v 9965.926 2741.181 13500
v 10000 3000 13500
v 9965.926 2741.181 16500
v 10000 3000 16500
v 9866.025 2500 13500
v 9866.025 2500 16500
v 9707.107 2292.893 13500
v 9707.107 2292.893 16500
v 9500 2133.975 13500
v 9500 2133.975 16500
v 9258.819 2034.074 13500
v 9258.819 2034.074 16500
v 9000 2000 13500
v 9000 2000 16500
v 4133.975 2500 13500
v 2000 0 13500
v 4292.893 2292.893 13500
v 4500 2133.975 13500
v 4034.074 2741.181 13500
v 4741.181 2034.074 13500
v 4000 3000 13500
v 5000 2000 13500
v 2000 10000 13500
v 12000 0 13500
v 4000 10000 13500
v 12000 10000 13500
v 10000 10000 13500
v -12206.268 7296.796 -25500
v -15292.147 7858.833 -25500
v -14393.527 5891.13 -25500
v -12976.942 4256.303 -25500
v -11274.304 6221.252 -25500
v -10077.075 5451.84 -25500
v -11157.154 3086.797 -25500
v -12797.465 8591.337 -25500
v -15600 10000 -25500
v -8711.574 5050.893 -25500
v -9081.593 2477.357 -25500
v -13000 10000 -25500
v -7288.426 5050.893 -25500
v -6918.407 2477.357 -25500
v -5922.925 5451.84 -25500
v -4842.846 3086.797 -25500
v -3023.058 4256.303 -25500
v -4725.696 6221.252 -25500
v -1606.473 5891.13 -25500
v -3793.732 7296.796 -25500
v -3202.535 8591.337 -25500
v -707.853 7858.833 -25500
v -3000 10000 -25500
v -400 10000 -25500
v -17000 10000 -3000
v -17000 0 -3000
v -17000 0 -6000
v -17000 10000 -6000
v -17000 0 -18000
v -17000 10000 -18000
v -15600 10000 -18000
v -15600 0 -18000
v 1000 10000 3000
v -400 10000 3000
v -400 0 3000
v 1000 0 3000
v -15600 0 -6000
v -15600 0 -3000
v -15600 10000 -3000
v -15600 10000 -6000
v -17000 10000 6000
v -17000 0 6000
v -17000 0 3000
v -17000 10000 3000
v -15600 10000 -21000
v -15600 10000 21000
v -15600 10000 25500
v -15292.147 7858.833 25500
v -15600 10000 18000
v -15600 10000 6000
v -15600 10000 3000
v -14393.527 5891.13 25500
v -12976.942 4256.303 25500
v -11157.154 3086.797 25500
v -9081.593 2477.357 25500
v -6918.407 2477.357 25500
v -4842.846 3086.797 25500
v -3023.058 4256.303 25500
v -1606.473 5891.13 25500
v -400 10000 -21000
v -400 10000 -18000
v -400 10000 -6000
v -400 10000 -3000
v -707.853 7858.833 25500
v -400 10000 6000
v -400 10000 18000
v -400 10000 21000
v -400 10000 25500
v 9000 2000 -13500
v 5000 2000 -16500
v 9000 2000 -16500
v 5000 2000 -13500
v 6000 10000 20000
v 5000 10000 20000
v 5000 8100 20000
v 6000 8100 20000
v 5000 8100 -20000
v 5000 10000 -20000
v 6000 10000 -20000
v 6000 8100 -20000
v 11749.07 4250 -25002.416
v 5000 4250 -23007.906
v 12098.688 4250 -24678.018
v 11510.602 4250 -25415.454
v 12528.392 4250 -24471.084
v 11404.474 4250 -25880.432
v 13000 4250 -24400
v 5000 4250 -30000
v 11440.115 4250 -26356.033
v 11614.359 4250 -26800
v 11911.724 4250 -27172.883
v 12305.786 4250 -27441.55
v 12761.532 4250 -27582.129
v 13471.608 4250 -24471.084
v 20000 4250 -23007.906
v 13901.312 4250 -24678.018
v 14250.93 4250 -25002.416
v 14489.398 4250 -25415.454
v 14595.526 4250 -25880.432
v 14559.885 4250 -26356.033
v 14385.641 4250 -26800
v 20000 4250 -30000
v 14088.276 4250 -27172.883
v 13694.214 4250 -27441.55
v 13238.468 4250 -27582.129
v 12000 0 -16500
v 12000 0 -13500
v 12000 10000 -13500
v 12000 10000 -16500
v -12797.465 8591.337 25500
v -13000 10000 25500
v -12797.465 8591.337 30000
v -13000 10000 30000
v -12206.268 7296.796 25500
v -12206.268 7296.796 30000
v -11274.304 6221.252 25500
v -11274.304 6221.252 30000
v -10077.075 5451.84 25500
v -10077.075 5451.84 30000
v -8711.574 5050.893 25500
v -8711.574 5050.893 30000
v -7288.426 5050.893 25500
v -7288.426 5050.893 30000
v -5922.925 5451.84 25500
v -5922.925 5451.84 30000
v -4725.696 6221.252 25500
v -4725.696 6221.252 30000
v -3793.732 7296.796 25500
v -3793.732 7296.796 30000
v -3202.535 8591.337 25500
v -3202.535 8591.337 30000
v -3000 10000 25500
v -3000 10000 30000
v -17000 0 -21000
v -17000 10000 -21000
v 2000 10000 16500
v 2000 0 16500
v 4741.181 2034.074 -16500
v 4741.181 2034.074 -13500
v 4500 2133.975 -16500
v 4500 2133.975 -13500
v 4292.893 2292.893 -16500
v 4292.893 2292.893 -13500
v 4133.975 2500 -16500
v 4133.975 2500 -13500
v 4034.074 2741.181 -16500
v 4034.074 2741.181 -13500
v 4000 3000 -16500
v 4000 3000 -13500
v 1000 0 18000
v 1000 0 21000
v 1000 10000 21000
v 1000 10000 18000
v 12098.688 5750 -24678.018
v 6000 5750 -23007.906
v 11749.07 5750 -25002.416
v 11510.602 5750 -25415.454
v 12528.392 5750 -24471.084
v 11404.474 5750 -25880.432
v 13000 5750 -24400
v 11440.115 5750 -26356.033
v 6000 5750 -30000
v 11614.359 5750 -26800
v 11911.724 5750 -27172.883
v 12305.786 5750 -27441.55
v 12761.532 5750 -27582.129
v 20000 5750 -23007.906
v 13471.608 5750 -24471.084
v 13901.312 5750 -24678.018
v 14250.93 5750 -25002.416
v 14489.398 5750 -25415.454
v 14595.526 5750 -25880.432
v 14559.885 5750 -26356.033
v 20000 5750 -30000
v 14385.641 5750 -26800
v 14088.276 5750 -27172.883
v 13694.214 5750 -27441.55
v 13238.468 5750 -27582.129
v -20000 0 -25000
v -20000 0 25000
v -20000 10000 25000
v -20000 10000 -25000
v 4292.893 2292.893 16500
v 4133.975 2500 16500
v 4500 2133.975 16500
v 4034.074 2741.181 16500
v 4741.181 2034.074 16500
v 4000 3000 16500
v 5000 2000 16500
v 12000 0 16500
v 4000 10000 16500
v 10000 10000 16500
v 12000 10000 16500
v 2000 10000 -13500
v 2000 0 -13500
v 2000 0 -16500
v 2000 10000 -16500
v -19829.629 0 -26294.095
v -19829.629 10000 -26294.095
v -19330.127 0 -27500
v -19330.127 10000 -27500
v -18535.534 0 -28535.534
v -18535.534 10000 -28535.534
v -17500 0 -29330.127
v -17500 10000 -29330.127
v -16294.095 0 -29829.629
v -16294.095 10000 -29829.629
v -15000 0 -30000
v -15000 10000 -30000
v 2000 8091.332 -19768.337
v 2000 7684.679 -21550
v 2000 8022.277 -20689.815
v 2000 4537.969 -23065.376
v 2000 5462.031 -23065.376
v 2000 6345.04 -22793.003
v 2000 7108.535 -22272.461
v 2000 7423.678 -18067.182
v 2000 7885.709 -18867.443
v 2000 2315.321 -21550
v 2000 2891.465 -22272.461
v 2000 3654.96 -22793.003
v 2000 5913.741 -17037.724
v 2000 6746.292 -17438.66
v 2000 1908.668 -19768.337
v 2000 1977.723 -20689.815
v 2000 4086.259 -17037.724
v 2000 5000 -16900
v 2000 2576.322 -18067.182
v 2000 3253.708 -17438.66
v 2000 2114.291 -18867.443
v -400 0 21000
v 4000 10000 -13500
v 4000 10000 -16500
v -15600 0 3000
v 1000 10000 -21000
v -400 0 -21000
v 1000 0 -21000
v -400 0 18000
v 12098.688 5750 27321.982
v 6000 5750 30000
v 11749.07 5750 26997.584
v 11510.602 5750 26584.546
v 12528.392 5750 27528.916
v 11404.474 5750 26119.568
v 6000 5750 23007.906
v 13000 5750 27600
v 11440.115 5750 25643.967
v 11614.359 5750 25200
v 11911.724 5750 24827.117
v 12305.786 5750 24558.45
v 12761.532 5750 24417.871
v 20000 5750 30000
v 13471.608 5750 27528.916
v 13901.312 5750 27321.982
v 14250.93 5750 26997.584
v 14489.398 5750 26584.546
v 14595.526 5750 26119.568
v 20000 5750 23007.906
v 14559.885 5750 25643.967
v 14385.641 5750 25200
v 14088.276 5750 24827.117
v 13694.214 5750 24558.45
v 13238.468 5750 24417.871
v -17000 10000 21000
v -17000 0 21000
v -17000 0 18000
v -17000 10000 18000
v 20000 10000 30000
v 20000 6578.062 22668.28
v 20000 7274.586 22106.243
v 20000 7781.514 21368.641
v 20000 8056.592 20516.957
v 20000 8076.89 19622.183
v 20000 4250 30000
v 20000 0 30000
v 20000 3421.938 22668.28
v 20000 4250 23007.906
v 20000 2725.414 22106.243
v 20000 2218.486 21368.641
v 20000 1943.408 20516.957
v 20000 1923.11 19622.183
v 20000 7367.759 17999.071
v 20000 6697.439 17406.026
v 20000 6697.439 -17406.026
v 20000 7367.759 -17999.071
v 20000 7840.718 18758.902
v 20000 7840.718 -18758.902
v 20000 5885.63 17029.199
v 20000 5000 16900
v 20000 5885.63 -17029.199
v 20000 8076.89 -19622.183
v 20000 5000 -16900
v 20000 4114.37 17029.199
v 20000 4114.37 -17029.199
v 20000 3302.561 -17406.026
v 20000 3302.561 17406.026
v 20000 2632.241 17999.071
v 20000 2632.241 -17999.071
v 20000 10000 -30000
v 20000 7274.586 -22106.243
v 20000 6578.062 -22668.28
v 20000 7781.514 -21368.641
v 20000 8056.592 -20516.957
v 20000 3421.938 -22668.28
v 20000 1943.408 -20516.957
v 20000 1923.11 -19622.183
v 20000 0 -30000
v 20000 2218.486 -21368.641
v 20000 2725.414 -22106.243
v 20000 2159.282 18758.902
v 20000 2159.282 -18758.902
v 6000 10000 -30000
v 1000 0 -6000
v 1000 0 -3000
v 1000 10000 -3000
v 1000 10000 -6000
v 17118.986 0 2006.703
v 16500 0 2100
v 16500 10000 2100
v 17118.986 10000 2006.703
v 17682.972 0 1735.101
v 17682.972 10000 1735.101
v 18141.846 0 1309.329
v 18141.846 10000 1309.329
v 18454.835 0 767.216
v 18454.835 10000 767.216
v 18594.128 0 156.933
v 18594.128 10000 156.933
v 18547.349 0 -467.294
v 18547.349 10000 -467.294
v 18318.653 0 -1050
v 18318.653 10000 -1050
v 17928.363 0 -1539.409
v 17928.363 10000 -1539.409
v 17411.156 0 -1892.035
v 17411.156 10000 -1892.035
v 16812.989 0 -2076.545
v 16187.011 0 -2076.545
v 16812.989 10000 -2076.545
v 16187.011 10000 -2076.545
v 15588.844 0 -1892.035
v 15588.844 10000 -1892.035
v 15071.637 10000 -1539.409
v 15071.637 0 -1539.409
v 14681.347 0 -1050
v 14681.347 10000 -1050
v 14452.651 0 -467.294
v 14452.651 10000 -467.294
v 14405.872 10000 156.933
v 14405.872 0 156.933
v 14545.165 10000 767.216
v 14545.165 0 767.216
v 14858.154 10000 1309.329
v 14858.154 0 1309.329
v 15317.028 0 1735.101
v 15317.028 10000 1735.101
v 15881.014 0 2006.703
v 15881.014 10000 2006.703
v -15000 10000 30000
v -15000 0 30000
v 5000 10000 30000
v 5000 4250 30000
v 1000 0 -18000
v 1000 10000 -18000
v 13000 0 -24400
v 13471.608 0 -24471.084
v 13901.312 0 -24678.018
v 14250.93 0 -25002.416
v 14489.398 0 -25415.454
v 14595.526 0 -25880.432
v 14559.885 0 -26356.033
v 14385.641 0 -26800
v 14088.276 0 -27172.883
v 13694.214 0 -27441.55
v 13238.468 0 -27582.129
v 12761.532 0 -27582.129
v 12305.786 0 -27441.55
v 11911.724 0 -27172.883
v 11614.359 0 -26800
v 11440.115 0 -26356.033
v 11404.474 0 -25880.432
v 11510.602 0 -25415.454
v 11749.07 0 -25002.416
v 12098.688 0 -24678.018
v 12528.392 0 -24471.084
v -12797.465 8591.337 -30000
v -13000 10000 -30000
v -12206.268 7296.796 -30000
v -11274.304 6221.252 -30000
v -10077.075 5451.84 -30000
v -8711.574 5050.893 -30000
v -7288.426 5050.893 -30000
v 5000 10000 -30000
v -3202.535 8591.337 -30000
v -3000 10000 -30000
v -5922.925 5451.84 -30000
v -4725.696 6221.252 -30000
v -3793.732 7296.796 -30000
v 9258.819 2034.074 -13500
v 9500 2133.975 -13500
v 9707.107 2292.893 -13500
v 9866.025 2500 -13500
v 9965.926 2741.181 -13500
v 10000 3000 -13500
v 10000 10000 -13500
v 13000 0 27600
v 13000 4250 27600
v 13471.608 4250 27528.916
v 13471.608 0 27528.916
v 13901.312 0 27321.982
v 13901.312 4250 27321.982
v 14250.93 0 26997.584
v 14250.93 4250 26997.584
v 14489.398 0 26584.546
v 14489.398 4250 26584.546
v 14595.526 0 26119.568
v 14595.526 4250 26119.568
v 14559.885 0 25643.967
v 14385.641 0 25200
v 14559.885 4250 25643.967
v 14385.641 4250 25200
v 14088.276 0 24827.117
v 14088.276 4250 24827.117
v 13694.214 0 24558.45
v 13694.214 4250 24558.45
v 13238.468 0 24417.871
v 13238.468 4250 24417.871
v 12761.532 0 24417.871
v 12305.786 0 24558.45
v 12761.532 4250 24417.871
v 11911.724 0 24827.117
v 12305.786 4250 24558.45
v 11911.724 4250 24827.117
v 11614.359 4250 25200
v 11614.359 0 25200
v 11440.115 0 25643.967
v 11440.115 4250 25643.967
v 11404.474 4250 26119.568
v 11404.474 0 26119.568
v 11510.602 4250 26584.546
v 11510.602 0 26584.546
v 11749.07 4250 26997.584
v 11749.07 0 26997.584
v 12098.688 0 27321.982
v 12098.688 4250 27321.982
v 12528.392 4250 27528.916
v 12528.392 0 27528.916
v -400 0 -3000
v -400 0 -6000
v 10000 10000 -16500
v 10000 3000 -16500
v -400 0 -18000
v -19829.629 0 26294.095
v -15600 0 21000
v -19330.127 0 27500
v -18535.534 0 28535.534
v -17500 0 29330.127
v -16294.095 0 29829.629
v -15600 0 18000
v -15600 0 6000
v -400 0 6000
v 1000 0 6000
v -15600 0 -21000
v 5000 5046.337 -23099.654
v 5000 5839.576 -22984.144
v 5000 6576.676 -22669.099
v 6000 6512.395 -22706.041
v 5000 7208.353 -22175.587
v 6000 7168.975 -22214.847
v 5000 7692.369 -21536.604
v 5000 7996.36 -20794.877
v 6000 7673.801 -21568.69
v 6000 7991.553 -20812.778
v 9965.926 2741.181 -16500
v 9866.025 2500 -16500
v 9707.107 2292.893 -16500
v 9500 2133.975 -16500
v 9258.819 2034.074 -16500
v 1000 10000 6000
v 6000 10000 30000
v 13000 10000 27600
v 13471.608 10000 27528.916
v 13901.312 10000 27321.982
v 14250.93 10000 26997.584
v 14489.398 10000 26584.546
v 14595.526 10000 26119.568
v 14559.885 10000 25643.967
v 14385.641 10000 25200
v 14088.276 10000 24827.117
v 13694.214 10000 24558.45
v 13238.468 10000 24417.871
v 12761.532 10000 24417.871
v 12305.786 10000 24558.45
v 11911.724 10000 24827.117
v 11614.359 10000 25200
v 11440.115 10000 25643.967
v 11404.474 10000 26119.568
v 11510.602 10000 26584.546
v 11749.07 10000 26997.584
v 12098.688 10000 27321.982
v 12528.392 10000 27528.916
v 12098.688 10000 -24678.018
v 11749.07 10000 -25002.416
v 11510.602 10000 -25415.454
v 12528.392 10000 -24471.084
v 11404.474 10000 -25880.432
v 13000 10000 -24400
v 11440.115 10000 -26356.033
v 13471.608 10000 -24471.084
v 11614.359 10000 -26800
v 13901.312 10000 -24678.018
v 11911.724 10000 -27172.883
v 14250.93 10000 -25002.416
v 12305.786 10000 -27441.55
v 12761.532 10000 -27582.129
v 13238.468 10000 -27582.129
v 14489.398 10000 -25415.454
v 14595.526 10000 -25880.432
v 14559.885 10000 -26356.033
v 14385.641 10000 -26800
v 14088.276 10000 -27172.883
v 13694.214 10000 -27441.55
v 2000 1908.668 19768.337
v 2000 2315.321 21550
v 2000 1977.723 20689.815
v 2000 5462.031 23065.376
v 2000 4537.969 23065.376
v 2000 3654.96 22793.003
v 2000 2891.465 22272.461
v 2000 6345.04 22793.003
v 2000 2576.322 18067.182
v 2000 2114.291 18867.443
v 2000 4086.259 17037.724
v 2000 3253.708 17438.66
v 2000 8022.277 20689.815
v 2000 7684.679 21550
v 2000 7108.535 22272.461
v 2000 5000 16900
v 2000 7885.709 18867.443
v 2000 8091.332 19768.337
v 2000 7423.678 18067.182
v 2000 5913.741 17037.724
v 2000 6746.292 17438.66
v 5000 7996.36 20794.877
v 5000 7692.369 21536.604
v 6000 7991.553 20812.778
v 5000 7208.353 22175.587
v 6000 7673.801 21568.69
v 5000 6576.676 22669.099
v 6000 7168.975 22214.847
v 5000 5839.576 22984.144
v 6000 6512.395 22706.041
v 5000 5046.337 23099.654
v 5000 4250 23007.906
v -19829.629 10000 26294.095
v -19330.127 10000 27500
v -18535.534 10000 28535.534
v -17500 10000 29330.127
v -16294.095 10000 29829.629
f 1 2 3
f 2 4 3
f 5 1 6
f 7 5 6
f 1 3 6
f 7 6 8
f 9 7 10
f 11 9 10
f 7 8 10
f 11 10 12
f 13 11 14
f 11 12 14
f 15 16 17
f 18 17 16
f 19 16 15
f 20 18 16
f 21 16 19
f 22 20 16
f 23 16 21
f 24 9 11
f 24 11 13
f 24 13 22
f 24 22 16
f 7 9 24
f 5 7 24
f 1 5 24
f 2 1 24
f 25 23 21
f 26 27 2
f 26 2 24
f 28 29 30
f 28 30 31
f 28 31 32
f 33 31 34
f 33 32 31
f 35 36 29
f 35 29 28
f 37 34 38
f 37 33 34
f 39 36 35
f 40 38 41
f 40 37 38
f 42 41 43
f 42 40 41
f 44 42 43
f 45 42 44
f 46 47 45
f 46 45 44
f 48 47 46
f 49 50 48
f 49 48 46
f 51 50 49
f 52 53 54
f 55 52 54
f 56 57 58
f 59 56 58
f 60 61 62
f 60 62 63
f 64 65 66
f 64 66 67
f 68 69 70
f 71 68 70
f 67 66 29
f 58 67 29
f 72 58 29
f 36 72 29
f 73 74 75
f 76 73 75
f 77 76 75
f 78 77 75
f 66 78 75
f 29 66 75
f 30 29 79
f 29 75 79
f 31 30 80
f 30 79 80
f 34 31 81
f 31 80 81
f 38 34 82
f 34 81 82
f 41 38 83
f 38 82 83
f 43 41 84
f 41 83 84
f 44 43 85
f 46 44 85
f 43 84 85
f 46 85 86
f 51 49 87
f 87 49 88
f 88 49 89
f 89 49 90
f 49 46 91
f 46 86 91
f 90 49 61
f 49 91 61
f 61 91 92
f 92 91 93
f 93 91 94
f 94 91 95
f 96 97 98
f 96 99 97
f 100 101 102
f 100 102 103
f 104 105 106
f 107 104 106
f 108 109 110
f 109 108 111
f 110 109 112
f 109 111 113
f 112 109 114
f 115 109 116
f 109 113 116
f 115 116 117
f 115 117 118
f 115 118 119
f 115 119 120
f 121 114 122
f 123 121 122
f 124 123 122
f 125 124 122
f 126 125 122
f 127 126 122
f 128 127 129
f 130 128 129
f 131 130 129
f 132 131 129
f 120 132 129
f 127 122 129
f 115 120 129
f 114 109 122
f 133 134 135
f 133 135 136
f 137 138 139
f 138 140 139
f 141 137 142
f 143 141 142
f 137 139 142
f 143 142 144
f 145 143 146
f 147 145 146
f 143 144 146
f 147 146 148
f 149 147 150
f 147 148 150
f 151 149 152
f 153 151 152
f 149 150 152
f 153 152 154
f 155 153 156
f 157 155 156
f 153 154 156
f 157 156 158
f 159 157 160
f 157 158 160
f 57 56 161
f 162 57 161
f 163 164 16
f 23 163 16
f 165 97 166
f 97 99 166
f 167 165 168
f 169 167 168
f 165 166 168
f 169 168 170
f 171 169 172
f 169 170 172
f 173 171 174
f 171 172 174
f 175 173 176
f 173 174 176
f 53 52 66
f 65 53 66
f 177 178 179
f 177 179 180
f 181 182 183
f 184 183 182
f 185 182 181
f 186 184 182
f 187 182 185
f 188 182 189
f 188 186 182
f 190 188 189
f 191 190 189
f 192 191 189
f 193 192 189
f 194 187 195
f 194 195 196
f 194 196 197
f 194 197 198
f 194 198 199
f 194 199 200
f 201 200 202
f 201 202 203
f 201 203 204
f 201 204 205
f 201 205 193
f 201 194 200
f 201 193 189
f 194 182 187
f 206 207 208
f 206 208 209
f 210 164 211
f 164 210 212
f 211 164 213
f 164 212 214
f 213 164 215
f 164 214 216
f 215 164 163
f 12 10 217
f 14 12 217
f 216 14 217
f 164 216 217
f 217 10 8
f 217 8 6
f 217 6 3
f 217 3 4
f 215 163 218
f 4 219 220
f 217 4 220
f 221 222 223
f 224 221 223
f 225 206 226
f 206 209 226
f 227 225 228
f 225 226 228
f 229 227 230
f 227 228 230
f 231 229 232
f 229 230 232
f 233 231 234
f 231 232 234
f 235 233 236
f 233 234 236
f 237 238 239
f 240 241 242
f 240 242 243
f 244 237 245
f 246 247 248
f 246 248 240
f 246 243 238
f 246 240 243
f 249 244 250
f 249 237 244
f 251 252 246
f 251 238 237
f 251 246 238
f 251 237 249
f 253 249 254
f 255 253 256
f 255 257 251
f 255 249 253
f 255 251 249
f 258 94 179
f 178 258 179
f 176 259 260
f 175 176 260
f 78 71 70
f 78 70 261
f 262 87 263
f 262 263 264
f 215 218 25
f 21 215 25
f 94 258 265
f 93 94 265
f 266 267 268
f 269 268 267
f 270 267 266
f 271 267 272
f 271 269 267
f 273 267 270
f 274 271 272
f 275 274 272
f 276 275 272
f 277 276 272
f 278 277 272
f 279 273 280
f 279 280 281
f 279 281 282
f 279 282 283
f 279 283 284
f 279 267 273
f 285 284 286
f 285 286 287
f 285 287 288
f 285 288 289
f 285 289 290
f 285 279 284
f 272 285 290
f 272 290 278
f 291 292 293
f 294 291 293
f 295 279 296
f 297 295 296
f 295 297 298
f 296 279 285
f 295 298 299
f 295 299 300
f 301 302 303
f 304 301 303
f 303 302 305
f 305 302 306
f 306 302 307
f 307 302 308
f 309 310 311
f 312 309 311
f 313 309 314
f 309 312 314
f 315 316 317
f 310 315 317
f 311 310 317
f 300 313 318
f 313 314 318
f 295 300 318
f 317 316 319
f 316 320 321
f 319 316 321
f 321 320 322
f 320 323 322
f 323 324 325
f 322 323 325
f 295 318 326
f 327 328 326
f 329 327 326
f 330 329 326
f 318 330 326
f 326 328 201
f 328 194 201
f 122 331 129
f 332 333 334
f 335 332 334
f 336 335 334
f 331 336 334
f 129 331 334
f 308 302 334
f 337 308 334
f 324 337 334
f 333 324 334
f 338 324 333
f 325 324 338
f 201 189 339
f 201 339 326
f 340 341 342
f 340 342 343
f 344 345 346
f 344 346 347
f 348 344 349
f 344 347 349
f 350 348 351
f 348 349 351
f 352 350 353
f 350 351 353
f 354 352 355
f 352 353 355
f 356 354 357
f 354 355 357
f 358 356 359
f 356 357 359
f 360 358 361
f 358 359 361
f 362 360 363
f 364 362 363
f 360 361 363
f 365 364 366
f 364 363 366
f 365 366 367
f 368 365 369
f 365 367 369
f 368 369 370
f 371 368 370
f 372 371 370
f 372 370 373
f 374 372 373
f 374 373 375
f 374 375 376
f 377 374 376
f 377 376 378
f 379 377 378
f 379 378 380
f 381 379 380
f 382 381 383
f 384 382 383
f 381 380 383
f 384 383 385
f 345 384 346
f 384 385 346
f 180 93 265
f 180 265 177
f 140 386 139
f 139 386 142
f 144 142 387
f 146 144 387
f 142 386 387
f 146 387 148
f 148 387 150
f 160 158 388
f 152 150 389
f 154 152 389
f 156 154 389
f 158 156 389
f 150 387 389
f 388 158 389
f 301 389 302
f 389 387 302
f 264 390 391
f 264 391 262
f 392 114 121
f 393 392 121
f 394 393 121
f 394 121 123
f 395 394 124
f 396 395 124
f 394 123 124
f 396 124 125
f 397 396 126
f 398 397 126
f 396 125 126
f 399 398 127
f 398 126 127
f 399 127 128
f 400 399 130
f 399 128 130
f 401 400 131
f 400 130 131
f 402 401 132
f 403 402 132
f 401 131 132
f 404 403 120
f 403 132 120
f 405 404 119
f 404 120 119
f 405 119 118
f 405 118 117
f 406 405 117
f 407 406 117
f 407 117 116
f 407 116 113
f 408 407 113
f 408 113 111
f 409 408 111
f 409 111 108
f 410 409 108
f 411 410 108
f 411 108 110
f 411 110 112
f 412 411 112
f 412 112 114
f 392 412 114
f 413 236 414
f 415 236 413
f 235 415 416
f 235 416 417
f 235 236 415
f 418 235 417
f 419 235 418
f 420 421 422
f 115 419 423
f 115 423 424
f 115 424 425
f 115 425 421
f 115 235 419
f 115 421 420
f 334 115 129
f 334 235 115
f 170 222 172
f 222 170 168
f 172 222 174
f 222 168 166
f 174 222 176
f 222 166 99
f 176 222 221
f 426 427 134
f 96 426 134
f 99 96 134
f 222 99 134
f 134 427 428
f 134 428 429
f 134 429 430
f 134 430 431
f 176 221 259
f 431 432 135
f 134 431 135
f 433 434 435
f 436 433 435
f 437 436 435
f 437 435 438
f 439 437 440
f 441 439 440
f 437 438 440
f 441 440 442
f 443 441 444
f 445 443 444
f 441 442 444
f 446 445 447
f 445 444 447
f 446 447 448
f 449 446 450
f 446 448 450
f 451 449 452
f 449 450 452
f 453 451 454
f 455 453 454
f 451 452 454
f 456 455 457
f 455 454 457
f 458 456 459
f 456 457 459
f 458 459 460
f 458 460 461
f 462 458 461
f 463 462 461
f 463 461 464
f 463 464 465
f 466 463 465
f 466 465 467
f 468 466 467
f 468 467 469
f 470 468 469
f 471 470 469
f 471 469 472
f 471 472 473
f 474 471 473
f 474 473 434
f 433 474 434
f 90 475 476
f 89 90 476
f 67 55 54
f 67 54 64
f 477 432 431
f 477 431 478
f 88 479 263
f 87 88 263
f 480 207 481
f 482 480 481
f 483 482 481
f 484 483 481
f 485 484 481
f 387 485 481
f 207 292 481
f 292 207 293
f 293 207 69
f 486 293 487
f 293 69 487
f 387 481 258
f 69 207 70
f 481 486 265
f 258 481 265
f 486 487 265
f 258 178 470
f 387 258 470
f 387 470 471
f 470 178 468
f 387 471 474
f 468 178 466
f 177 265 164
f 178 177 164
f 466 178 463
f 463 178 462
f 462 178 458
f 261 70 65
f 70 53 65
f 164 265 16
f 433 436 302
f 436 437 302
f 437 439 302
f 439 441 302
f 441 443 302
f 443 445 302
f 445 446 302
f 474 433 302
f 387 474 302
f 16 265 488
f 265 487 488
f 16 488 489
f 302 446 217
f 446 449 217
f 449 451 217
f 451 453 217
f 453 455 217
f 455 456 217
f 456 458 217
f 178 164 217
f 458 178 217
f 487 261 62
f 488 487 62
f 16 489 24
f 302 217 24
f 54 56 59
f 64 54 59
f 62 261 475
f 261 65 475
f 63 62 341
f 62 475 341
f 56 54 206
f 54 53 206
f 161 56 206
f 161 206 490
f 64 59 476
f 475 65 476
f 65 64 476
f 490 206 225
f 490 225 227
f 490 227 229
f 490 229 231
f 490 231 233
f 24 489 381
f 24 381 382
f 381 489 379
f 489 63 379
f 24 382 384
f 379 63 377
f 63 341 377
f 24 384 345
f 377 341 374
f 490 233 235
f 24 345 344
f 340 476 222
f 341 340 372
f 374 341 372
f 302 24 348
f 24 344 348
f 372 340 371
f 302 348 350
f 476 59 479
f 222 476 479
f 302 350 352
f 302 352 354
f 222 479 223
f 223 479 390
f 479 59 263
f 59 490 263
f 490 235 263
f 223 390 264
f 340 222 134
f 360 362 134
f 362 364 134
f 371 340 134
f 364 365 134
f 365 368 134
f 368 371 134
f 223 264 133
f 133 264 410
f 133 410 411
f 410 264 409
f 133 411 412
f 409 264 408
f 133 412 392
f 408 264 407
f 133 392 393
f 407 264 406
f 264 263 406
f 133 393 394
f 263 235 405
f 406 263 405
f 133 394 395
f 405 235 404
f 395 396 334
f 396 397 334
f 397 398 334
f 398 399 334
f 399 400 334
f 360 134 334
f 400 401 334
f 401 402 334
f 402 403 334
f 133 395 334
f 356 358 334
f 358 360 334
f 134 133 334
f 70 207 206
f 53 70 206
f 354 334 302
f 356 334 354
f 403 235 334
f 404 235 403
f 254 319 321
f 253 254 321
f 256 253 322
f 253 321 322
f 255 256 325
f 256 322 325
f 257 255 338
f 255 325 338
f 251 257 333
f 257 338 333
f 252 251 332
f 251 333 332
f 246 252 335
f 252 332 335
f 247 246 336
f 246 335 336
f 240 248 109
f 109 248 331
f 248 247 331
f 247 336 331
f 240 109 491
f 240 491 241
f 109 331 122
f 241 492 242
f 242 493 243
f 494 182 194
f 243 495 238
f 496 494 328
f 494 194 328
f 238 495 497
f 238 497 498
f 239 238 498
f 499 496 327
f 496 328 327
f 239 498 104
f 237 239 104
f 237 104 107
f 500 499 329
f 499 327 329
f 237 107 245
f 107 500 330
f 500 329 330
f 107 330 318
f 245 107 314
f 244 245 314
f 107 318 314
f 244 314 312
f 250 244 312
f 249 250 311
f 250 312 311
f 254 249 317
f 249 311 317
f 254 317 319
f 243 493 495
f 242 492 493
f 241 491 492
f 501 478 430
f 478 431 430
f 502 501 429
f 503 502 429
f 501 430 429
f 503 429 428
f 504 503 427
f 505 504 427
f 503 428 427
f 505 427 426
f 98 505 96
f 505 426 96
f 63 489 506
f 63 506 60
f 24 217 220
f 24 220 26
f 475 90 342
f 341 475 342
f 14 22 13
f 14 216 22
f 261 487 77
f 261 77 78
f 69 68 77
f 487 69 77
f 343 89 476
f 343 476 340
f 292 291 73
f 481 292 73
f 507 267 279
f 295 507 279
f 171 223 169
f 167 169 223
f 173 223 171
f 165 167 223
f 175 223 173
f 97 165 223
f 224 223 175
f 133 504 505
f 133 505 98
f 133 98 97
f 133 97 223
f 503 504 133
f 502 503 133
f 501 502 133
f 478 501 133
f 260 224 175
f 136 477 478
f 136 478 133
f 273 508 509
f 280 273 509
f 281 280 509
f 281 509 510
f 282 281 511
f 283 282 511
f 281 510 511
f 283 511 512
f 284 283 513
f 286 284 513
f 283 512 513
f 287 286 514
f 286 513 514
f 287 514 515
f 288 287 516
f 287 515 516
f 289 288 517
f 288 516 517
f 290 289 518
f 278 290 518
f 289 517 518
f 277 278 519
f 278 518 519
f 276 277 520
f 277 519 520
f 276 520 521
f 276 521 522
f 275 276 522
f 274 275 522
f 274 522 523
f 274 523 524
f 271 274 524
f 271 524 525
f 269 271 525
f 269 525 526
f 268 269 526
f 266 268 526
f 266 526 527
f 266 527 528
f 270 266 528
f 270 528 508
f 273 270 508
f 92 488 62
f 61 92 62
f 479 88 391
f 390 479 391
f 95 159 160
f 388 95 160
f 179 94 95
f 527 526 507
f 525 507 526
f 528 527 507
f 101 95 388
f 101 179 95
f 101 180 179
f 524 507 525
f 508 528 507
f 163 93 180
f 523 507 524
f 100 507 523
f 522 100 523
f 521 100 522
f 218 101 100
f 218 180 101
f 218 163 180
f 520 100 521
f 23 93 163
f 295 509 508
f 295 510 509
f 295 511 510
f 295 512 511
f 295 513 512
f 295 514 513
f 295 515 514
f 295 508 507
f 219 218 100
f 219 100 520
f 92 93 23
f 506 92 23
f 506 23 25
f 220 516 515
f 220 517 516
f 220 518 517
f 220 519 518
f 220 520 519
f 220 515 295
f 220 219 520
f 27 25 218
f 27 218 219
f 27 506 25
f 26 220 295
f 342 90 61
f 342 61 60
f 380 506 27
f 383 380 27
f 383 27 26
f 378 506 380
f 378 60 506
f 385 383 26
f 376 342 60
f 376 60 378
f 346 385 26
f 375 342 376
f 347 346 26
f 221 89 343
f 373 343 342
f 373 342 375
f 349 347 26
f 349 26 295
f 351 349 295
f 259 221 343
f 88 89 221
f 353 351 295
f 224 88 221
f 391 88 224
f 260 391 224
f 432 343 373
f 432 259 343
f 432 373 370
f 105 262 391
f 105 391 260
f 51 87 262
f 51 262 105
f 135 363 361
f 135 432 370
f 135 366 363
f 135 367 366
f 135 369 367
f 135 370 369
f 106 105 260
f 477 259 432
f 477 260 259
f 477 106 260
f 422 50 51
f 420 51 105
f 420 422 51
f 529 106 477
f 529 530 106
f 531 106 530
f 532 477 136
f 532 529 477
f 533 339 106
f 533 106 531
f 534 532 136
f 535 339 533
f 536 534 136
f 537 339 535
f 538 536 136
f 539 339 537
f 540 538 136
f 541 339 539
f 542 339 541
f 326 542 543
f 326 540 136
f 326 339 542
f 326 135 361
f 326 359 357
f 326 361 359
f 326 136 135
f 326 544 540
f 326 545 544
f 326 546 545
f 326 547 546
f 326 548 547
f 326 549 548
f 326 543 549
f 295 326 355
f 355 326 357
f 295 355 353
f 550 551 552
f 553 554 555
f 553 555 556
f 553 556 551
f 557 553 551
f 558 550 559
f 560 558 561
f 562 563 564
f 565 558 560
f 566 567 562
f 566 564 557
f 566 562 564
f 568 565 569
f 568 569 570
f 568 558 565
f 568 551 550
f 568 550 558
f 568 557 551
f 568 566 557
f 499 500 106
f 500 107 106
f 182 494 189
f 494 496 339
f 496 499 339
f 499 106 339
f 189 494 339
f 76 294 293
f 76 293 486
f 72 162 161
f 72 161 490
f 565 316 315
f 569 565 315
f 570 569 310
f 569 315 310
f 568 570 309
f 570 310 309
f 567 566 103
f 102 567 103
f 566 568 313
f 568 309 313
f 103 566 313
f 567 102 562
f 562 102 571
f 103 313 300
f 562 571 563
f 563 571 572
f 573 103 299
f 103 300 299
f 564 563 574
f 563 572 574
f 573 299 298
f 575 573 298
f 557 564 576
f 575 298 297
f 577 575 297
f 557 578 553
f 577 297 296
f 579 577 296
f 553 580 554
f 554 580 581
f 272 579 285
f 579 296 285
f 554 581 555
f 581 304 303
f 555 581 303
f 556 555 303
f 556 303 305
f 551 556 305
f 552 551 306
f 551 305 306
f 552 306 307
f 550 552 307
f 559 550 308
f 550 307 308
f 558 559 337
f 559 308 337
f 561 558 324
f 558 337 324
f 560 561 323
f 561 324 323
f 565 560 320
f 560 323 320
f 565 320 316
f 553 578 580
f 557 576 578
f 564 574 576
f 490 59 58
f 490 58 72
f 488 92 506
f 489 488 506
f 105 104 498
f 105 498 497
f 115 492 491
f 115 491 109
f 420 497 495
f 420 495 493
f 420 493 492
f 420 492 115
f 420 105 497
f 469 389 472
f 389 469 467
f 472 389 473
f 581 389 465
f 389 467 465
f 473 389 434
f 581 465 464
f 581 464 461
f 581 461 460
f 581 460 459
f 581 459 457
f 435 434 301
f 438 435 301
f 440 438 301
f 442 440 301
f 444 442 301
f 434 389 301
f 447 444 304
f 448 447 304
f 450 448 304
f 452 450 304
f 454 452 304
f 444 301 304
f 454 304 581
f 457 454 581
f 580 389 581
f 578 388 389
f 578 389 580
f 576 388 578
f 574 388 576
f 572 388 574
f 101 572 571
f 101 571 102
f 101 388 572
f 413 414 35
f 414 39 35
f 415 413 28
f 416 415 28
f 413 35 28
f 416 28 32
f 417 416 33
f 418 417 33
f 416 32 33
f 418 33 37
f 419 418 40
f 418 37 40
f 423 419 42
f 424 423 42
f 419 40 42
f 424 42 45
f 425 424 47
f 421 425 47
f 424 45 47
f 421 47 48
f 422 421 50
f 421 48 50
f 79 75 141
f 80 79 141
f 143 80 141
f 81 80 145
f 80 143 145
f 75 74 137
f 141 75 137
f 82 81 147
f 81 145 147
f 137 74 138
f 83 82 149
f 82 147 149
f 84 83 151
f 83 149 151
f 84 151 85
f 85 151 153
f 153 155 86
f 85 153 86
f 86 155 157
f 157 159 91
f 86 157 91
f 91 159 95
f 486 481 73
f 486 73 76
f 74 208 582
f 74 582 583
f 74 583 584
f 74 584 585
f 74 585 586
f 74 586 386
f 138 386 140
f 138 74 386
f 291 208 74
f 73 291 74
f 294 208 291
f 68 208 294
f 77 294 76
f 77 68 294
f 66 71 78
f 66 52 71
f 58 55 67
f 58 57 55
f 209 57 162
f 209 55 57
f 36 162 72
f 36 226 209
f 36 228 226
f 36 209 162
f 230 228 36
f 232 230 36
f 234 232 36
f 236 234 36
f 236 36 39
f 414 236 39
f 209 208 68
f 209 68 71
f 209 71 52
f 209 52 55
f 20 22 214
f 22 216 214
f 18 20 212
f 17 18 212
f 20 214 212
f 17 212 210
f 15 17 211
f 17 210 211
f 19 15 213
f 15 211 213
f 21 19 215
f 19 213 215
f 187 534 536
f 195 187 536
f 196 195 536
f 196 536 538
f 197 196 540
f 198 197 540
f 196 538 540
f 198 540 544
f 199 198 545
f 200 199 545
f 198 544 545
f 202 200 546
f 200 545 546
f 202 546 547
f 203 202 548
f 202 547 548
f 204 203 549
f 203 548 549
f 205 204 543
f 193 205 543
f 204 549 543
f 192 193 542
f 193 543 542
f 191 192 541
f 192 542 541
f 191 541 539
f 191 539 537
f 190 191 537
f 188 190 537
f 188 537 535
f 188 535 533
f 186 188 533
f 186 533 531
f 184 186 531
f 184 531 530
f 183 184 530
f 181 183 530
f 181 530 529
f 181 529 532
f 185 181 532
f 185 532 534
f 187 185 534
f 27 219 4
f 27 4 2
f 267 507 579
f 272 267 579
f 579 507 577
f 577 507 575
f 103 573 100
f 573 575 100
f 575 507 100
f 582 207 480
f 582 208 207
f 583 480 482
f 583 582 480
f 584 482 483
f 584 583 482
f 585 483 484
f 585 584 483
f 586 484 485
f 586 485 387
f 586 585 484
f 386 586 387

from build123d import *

# Parameters (mm, degrees)
SKETCH_2_W           = 40000
SKETCH_2_H           = 60000
EXTRUDE_1_DEPTH      = 10000
SKETCH_4_R           = 7600
CUT_EXTRUDE_2_DEPTH  = 25500
SKETCH_5_R           = 5000
CUT_EXTRUDE_3_DEPTH  = 40000
SKETCH_6_W           = 2000
SKETCH_6_H           = 3000
CUT_EXTRUDE_4_DEPTH  = 80000
SKETCH_13_R          = 3100
CUT_EXTRUDE_6_DEPTH  = 18000
SKETCH_16_W          = 10031.479605139
SKETCH_16_H          = 1500
CUT_EXTRUDE_7_DEPTH  = 15000
CUT_EXTRUDE_8_REACH  = 37418.574
SKETCH_17_W          = 1000
SKETCH_17_H          = 10000
SKETCH_18_R          = 1600
CUT_EXTRUDE_9_DEPTH  = 15000
SKETCH_19_W          = 1400
SKETCH_19_H          = 3000
CUT_EXTRUDE_10_DEPTH = 15000
FILLET_1_R           = 5000
SKETCH_20_R          = 2100
CUT_EXTRUDE_11_DEPTH = 10000
SKETCH_21_W          = 6000
SKETCH_21_H          = 3000
CUT_EXTRUDE_12_DEPTH = 2000
FILLET_2_R           = 1000


with BuildPart() as part:
    # 草圖2 → 填料-伸長1 (new body)
    with BuildSketch(Plane(origin=(0, 0, 0), x_dir=(1, 0, 0), z_dir=(0, 1, 0))):
        Rectangle(SKETCH_2_W, SKETCH_2_H)
    extrude(amount=EXTRUDE_1_DEPTH)

    # 草圖4 → 除料-伸長2 (cut, symmetric)
    with BuildSketch(Plane.XY):
        with Locations((-8000, 10000)):
            Circle(SKETCH_4_R)
    extrude(amount=CUT_EXTRUDE_2_DEPTH, both=True, mode=Mode.SUBTRACT)

    # 草圖5 → 除料-伸長3 (cut, symmetric)
    with BuildSketch(Plane.XY):
        with Locations((-8000, 10000)):
            Circle(SKETCH_5_R)
    extrude(amount=CUT_EXTRUDE_3_DEPTH, both=True, mode=Mode.SUBTRACT)

    # 草圖6 → 除料-伸長4 (cut)
    with BuildSketch(Plane(origin=(0, 10000, 0), x_dir=(1, 0, 0), z_dir=(0, 1, 0))):
        with Locations((11000, -15000)):
            Rectangle(SKETCH_6_W, SKETCH_6_H)
        with Locations((3000, 15000)):
            Rectangle(SKETCH_6_W, SKETCH_6_H)
        with Locations((11000, 15000)):
            Rectangle(SKETCH_6_W, SKETCH_6_H)
        with Locations((3000, -15000)):
            Rectangle(SKETCH_6_W, SKETCH_6_H)
    extrude(amount=-CUT_EXTRUDE_4_DEPTH, mode=Mode.SUBTRACT)

    # 草圖13 → 除料-伸長6 (cut)
    with BuildSketch(Plane(origin=(20000, 0, 0), x_dir=(0, 0, -1), z_dir=(1, 0, 0))):
        with Locations((-20000, 5000)):
            Circle(SKETCH_13_R)
        with Locations(Location((20000, 5000, 0), (0, 0, 180))):
            Circle(SKETCH_13_R)
    extrude(amount=-CUT_EXTRUDE_6_DEPTH, mode=Mode.SUBTRACT)

    # 草圖16 → 除料-伸長7 (cut)
    with BuildSketch(Plane(origin=(20000, 0, 0), x_dir=(0, 0, -1), z_dir=(1, 0, 0))):
        with Locations((-26040.217814772, 5000)):
            Rectangle(SKETCH_16_W, SKETCH_16_H)
        with Locations((26040.217814772, 5000)):
            Rectangle(SKETCH_16_W, SKETCH_16_H)
    extrude(amount=-CUT_EXTRUDE_7_DEPTH, mode=Mode.SUBTRACT)

    # 除料-伸長8: up to this face of the body (flat: up to its plane)
    cut_extrude_8_end = Plane(part.part.faces().sort_by_distance((12500, 4250, -26503.95312427))[0])
    # 草圖17 → 除料-伸長8 (cut, up to the picked face)
    with BuildSketch(Plane(origin=(0, 10000, 0), x_dir=(1, 0, 0), z_dir=(0, 1, 0)), mode=Mode.PRIVATE) as cut_extrude_8_sk1:
        with Locations((5500, 25000)):
            Rectangle(SKETCH_17_W, SKETCH_17_H)
    cut_extrude_8_tool1 = split(extrude(cut_extrude_8_sk1.sketch, amount=-CUT_EXTRUDE_8_REACH, mode=Mode.PRIVATE), bisect_by=cut_extrude_8_end, keep=Keep.BOTH, mode=Mode.PRIVATE)
    # 草圖17 → 除料-伸長8 (cut, up to the picked face)
    with BuildSketch(Plane(origin=(0, 10000, 0), x_dir=(1, 0, 0), z_dir=(0, 1, 0)), mode=Mode.PRIVATE) as cut_extrude_8_sk2:
        with Locations((5500, -25000)):
            Rectangle(SKETCH_17_W, SKETCH_17_H)
    cut_extrude_8_tool2 = split(extrude(cut_extrude_8_sk2.sketch, amount=-CUT_EXTRUDE_8_REACH, mode=Mode.PRIVATE), bisect_by=cut_extrude_8_end, keep=Keep.BOTH, mode=Mode.PRIVATE)
    add(cut_extrude_8_tool1.solids().sort_by(Axis((5500, 10000, -25000), (0, -1, 0)))[0], mode=Mode.SUBTRACT)
    add(cut_extrude_8_tool2.solids().sort_by(Axis((5500, 10000, 25000), (0, -1, 0)))[0], mode=Mode.SUBTRACT)

    # 草圖18 → 除料-伸長9 (cut)
    with BuildSketch(Plane(origin=(0, 10000, 0), x_dir=(1, 0, 0), z_dir=(0, 1, 0))):
        with Locations(Location((13000, 26000, 0), (0, 0, 270))):
            Circle(SKETCH_18_R)
        with Locations(Location((13000, -26000, 0), (0, 0, 270))):
            Circle(SKETCH_18_R)
    extrude(amount=-CUT_EXTRUDE_9_DEPTH, mode=Mode.SUBTRACT)

    # 草圖19 → 除料-伸長10 (cut)
    with BuildSketch(Plane(origin=(0, 10000, 0), x_dir=(1, 0, 0), z_dir=(0, 1, 0))):
        with Locations((-16300, 19500)):
            Rectangle(SKETCH_19_W, SKETCH_19_H)
        with Locations((-16300, 4500)):
            Rectangle(SKETCH_19_W, SKETCH_19_H)
        with Locations((-16300, -4500)):
            Rectangle(SKETCH_19_W, SKETCH_19_H)
        with Locations((-16300, -19500)):
            Rectangle(SKETCH_19_W, SKETCH_19_H)
        with Locations((300, -19500)):
            Rectangle(SKETCH_19_W, SKETCH_19_H)
        with Locations((300, -4500)):
            Rectangle(SKETCH_19_W, SKETCH_19_H)
        with Locations((300, 4500)):
            Rectangle(SKETCH_19_W, SKETCH_19_H)
        with Locations((300, 19500)):
            Rectangle(SKETCH_19_W, SKETCH_19_H)
    extrude(amount=-CUT_EXTRUDE_10_DEPTH, mode=Mode.SUBTRACT)

    # 圓角1
    fillet_1_edges = [part.edges().sort_by_distance(p)[0] for p in [
        (-20000, 5000, 30000),
        (-20000, 5000, -30000),
    ]]
    fillet(fillet_1_edges, radius=FILLET_1_R)

    # 草圖20 → 除料-伸長11 (cut)
    with BuildSketch(Plane(origin=(0, 10000, 0), x_dir=(1, 0, 0), z_dir=(0, 1, 0))):
        with Locations(Location((16500, 0, 0), (0, 0, 270))):
            Circle(SKETCH_20_R)
    extrude(amount=-CUT_EXTRUDE_11_DEPTH, mode=Mode.SUBTRACT)

    # 草圖21 → 除料-伸長12 (cut)
    with BuildSketch(Plane.XZ):
        with Locations((7000, 15000)):
            Rectangle(SKETCH_21_W, SKETCH_21_H)
        with Locations((7000, -15000)):
            Rectangle(SKETCH_21_W, SKETCH_21_H)
    extrude(amount=-CUT_EXTRUDE_12_DEPTH, mode=Mode.SUBTRACT)

    # 圓角2
    fillet_2_edges = [part.edges().sort_by_distance(p)[0] for p in [
        (4000, 2000, 15000),
        (10000, 2000, 15000),
        (4000, 2000, -15000),
        (10000, 2000, -15000),
    ]]
    fillet(fillet_2_edges, radius=FILLET_2_R)


solid = part.part
